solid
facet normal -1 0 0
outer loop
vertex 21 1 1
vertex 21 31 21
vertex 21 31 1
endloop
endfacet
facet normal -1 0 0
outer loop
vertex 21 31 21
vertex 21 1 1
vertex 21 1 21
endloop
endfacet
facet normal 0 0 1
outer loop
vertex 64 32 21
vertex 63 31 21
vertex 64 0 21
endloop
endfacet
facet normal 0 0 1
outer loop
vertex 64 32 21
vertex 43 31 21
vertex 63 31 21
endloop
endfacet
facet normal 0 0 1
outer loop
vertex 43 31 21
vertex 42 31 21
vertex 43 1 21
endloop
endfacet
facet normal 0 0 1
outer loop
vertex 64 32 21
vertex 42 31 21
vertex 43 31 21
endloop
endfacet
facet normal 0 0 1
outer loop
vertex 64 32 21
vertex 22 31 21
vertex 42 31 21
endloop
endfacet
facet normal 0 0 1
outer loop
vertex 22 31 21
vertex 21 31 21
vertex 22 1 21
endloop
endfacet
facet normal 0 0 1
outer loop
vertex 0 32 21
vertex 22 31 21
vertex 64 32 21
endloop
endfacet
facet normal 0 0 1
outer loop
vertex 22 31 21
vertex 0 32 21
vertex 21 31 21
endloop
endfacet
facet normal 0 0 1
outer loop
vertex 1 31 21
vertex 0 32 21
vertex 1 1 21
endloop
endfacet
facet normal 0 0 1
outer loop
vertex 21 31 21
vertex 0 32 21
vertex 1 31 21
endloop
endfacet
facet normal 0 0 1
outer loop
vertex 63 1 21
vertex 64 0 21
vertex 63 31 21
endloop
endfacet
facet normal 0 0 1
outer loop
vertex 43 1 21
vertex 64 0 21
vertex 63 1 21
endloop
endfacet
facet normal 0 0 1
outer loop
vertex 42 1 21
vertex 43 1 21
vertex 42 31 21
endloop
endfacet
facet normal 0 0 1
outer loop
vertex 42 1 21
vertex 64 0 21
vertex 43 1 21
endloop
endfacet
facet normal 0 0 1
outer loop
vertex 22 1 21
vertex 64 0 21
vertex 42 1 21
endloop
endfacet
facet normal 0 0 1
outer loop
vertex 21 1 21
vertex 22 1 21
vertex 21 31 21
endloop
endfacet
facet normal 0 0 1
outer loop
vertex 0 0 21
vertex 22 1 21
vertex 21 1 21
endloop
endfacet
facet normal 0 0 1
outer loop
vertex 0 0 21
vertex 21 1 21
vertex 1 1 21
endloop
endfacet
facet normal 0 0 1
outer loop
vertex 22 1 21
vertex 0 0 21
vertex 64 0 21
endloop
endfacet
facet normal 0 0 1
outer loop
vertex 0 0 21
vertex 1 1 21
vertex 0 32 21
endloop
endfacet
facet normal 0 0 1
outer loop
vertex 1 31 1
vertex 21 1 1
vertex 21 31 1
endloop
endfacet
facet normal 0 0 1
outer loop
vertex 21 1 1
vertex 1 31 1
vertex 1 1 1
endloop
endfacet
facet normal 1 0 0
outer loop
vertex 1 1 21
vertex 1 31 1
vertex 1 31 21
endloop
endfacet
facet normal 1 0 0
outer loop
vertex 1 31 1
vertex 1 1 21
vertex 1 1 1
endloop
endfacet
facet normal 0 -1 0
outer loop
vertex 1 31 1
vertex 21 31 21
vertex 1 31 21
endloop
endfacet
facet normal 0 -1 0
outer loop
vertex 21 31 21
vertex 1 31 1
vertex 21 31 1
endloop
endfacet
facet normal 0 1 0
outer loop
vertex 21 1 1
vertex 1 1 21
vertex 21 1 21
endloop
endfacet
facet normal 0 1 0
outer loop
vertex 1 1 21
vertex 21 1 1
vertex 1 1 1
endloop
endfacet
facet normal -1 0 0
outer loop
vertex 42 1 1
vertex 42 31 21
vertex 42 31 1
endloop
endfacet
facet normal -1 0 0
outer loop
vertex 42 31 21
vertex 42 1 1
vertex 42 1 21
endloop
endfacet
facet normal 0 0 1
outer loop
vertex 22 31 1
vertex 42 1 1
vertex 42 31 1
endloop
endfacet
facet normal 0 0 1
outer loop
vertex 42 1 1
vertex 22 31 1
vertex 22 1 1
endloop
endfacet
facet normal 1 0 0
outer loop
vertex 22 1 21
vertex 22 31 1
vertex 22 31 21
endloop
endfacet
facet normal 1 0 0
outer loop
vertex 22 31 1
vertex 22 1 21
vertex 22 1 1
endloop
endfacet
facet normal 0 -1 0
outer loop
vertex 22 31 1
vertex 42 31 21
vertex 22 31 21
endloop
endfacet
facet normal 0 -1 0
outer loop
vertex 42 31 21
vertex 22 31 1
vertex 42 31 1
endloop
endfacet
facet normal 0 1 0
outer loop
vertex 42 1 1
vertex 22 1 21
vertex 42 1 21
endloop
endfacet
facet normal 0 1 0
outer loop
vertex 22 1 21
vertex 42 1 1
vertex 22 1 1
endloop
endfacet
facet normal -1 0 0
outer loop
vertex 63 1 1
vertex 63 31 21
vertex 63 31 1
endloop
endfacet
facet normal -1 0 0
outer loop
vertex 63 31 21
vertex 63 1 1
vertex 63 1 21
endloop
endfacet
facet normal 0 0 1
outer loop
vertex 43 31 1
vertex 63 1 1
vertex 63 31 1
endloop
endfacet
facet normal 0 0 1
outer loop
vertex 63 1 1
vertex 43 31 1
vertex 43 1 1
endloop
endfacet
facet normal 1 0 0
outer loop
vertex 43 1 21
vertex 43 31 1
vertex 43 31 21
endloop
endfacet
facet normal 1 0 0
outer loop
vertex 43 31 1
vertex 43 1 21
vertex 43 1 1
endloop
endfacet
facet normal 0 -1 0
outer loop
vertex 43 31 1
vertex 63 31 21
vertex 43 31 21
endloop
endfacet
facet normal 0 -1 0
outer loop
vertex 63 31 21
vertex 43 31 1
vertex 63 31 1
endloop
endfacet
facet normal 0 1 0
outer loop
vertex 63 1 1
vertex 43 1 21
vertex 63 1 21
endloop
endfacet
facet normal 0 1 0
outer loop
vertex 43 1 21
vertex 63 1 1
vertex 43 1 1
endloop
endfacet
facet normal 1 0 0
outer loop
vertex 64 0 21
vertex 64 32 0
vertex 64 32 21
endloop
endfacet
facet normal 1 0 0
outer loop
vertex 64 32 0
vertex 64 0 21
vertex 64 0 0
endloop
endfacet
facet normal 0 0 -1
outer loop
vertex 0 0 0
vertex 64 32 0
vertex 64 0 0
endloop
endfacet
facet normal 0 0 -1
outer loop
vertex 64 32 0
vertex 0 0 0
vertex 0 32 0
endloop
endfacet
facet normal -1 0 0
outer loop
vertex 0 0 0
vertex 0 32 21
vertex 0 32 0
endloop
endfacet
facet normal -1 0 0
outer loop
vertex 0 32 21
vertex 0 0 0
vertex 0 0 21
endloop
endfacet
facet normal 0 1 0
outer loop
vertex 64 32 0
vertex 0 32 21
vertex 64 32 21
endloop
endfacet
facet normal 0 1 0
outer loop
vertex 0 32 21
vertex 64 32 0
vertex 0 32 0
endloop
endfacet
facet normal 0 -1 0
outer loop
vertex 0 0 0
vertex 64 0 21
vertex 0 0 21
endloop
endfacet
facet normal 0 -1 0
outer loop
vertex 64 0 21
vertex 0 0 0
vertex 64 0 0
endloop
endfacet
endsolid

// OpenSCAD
// file: utils.scad
function boxXSize(count, size, innerThickness, outerThickness) = count * (size + innerThickness) - innerThickness + 2 * outerThickness;

function boxYSize(count, size, innerThickness, outerThickness) = count * (size + innerThickness) - innerThickness + 2 * outerThickness;

function boxZSize(size, bottomThickness) = bottomThickness + size;
// file: config.scad
cellSize = [20, 30, 20];
cellsCount = [3, 1];

// ---

innerThickness = 1;
outerThickness = 1;
coverThickness = 1;
bottomThickness = 1;

coverOverlap = 2;
coverGap = 0.2;

$fa = 1;
$fs = 0.2;
// main file
include <config.scad>;

use <utils.scad>;

module StorageBox(cellsCount, cellSize, innerThickness = innerThickness, outerThickness = outerThickness, bottomThickness = bottomThickness) {
    
    boxSize = [
        boxXSize(cellsCount.x, cellSize.x, innerThickness, outerThickness),
        boxYSize(cellsCount.y, cellSize.y, innerThickness, outerThickness),
        boxZSize(cellSize.z, bottomThickness)
    ];

    difference() {
        cube(boxSize);    // Outer bound

        union() {
            for (i = [1:cellsCount.x]) {
                for (j = [1:cellsCount.y]) {
                    x = outerThickness + (i-1) * (cellSize.x + innerThickness);
                    y = outerThickness + (j-1) * (cellSize.y + innerThickness);
                    z = bottomThickness;

                    translate([x, y, z]) cube([cellSize.x, cellSize.y, cellSize.z]);    // Cell
                }
            }
        }
    }
}

StorageBox(cellsCount, cellSize);
